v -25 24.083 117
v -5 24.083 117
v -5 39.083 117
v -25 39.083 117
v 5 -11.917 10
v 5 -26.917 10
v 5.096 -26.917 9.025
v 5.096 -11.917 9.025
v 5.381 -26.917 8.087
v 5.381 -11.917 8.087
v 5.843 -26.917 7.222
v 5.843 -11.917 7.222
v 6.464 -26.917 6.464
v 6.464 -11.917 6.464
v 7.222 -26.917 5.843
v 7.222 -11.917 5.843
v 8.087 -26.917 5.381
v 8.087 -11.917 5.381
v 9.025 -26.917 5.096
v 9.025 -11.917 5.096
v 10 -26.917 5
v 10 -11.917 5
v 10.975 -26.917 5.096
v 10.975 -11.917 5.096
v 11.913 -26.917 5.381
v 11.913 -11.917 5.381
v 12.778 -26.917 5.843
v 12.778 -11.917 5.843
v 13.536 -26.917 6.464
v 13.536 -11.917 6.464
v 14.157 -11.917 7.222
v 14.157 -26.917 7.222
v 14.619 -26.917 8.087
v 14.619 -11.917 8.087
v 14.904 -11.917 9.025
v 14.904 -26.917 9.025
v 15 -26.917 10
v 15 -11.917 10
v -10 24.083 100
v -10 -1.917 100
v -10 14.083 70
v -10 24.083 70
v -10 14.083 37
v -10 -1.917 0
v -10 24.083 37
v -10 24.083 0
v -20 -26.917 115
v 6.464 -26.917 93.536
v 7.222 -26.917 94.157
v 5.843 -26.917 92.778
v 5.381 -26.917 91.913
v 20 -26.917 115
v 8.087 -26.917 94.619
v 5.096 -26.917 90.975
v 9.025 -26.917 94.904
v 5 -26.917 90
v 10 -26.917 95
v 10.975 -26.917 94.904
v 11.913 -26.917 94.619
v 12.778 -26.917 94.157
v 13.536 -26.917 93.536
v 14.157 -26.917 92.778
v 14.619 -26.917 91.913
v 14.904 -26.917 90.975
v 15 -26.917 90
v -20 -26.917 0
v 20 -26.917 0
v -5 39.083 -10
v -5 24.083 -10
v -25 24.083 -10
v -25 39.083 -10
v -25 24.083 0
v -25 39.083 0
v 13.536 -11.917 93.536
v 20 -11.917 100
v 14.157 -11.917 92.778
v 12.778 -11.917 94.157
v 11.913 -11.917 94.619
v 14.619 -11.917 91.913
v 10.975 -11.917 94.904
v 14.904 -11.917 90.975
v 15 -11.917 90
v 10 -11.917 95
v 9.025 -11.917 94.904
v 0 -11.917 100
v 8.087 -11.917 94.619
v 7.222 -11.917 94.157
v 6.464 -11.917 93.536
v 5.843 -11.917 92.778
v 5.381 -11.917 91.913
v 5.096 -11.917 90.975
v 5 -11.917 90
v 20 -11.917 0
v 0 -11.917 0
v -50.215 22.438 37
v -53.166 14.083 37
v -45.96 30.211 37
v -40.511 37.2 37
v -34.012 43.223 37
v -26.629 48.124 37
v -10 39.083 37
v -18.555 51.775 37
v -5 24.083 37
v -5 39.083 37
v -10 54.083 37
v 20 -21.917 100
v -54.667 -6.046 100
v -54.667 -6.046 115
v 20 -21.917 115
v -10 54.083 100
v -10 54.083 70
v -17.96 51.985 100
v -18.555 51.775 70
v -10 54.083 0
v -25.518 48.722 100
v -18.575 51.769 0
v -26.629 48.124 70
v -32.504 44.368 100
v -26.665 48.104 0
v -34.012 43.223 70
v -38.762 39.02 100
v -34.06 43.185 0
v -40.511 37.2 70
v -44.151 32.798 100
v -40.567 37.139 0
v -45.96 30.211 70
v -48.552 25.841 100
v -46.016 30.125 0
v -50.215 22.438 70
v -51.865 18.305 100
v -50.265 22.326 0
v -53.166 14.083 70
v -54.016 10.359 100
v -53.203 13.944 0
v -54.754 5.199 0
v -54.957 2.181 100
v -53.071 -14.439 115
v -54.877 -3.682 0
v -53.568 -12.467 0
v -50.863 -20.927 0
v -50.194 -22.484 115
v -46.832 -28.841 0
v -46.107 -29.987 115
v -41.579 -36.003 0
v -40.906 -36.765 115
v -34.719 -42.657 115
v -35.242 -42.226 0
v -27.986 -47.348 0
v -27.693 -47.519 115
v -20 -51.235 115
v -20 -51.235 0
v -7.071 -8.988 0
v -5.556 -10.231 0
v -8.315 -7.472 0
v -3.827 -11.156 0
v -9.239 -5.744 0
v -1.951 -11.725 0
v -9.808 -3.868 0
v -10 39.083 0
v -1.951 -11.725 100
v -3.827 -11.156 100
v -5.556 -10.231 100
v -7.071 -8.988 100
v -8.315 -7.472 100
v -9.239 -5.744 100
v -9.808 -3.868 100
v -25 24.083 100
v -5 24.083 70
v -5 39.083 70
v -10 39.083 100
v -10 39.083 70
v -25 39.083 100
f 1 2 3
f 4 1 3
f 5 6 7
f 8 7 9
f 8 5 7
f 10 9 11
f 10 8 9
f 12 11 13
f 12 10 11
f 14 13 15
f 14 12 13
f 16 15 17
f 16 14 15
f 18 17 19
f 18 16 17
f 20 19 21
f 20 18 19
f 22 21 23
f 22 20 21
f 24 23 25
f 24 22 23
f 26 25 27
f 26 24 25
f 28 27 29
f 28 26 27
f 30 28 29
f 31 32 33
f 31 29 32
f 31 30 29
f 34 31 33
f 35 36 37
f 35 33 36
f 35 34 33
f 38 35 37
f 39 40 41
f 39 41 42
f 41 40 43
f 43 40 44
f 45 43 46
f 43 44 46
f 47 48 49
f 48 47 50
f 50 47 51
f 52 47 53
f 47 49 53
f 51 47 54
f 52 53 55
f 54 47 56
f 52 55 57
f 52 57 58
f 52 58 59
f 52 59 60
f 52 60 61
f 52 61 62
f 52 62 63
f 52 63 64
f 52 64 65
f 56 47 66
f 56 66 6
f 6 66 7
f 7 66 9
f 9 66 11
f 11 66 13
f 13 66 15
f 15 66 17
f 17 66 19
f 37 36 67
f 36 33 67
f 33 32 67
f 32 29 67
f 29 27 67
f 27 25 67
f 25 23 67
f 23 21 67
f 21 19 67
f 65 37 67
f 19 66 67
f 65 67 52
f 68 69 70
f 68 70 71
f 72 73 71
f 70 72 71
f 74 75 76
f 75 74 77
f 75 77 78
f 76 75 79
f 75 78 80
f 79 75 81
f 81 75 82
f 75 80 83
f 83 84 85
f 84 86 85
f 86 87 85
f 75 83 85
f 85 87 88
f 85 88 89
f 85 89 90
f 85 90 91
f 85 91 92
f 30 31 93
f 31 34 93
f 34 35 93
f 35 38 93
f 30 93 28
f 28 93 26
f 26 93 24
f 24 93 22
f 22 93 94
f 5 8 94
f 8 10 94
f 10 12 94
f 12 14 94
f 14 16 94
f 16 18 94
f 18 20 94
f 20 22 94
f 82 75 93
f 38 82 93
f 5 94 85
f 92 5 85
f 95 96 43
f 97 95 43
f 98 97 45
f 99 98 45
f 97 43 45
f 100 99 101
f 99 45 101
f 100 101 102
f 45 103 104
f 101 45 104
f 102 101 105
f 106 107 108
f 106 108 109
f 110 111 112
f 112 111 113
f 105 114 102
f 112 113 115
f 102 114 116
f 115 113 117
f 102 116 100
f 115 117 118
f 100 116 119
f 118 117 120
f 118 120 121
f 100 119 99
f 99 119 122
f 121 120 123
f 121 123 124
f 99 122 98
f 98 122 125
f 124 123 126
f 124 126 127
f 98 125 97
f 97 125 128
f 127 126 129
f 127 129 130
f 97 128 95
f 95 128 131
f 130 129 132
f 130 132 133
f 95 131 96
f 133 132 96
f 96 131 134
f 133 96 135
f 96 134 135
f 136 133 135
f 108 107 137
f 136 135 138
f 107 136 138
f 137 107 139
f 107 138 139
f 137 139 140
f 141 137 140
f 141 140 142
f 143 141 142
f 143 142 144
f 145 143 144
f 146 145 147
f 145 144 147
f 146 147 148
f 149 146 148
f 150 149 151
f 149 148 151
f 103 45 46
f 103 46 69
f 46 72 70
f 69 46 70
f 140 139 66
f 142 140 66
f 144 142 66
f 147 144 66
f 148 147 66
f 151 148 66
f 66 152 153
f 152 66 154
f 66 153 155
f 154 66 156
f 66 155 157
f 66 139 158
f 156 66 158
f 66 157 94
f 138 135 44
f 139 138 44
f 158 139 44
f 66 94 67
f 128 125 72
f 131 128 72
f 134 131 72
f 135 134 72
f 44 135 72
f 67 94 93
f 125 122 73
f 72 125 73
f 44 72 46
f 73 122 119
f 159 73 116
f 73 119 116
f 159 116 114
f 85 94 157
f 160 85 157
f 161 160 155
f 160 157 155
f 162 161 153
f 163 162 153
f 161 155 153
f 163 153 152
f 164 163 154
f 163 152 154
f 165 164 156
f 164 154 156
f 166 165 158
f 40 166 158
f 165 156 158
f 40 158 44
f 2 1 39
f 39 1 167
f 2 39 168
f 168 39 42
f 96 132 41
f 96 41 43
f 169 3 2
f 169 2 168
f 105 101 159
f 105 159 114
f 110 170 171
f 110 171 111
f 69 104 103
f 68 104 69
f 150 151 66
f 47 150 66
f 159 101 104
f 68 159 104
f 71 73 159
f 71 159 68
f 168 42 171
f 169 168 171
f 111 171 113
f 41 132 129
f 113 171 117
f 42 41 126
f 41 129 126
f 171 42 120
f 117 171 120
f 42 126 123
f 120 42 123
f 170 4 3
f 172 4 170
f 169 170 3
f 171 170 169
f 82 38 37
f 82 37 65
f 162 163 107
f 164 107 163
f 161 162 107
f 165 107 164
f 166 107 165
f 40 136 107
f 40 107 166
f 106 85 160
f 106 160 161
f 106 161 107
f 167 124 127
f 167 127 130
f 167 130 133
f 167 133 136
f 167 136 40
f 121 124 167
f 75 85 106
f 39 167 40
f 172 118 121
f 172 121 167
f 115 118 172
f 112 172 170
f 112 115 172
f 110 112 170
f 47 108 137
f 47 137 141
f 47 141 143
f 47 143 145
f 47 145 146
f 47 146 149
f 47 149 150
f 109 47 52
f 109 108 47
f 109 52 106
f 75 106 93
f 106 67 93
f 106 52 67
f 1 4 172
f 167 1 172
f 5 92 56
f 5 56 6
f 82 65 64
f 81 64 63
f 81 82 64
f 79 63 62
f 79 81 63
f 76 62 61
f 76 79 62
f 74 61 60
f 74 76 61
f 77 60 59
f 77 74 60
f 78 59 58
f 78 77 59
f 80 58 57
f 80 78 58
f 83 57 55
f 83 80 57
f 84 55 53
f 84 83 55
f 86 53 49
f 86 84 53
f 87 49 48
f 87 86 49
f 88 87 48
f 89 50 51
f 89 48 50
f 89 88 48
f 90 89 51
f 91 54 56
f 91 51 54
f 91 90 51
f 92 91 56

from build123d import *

# Parameters (mm, degrees)
BOSS_EXTRUDE1_DEPTH      = 115
CUT_EXTRUDE1_START       = -15
CUT_EXTRUDE1_DEPTH       = 15
CUT_EXTRUDE2_DEPTH       = 58
SKETCH6_W                = 33
SKETCH6_H                = 40
CUT_EXTRUDE3_DEPTH       = 58
BOSS_EXTRUDE2_DEPTH      = 5
BOSS_EXTRUDE2_DEPTH_BACK = 15
SKETCH7_W                = 47
SKETCH7_H                = 15
BOSS_EXTRUDE3_DEPTH      = 5
BOSS_EXTRUDE3_DEPTH_BACK = 15
SKETCH8_W                = 47
SKETCH8_H                = 15


with BuildPart() as part:
    # Sketch2 → Boss-Extrude1 (new body)
    with BuildSketch(Plane.XY):
        with BuildLine():
            Line((-20, -51.23475383), (-20, -26.916730868))
            Line((-20, -26.916730868), (20, -26.916730868))
            Line((20, -26.916730868), (20, -11.916730868))
            Line((20, -11.916730868), (0, -11.916730868))
            ThreePointArc((0, -11.916730868), (-7.071067812, -8.98779868), (-10, -1.916730868))
            Line((-10, -1.916730868), (-10, 54.083269132))
            ThreePointArc((-10, 54.083269132), (-54.753734942, 5.198895061), (-20, -51.23475383))
        make_face()
    extrude(amount=BOSS_EXTRUDE1_DEPTH)

    # Sketch3 → Cut-Extrude1 (cut)
    with BuildSketch(Plane.XY.offset(115).offset(CUT_EXTRUDE1_START)):
        with BuildLine():
            Line((-54.666698166, -6.045834235), (20, -21.916730868))
            Line((20, -21.916730868), (20, -11.916730868))
            Line((20, -11.916730868), (0, -11.916730868))
            ThreePointArc((0, -11.916730868), (-7.071067812, -8.98779868), (-10, -1.916730868))
            Line((-10, -1.916730868), (-10, 54.083269132))
            ThreePointArc((-10, 54.083269132), (-44.151135103, 32.797519253), (-54.666698166, -6.045834235))
        make_face()
    extrude(amount=CUT_EXTRUDE1_DEPTH, mode=Mode.SUBTRACT)

    # Sketch4 → Cut-Extrude2 (cut)
    with BuildSketch(Plane(origin=(0, -11.916730868, 0), x_dir=(1, 0, 0), z_dir=(0, 1, 0))):
        with BuildLine():
            Line((15, -10), (15, -90))
            ThreePointArc((15, -90), (10, -95), (5, -90))
            Line((5, -90), (5, -10))
            ThreePointArc((5, -10), (10, -5), (15, -10))
        make_face()
    extrude(amount=-CUT_EXTRUDE2_DEPTH, mode=Mode.SUBTRACT)

    # Sketch6 → Cut-Extrude3 (cut)
    with BuildSketch(Plane(origin=(-10, 0, 0), x_dir=(0, 0, -1), z_dir=(1, 0, 0))):
        with Locations((-53.5, 34.083269132)):
            Rectangle(SKETCH6_W, SKETCH6_H)
    extrude(amount=-CUT_EXTRUDE3_DEPTH, mode=Mode.SUBTRACT)

    # Sketch7 → Boss-Extrude2 (add, two sides: drawn at the far end of the back side and taken through both)
    with BuildSketch(Plane(origin=(-10, 0, 0), x_dir=(0, 0, -1), z_dir=(1, 0, 0)).offset(-BOSS_EXTRUDE2_DEPTH_BACK)):
        with Locations((-13.5, 31.583269132)):
            Rectangle(SKETCH7_W, SKETCH7_H)
    extrude(amount=BOSS_EXTRUDE2_DEPTH + BOSS_EXTRUDE2_DEPTH_BACK)

    # Sketch8 → Boss-Extrude3 (add, two sides: drawn at the far end of the back side and taken through both)
    with BuildSketch(Plane(origin=(-10, 0, 0), x_dir=(0, 0, -1), z_dir=(1, 0, 0)).offset(-BOSS_EXTRUDE3_DEPTH_BACK)):
        with Locations((-93.5, 31.583269132)):
            Rectangle(SKETCH8_W, SKETCH8_H)
    extrude(amount=BOSS_EXTRUDE3_DEPTH + BOSS_EXTRUDE3_DEPTH_BACK)


solid = part.part
